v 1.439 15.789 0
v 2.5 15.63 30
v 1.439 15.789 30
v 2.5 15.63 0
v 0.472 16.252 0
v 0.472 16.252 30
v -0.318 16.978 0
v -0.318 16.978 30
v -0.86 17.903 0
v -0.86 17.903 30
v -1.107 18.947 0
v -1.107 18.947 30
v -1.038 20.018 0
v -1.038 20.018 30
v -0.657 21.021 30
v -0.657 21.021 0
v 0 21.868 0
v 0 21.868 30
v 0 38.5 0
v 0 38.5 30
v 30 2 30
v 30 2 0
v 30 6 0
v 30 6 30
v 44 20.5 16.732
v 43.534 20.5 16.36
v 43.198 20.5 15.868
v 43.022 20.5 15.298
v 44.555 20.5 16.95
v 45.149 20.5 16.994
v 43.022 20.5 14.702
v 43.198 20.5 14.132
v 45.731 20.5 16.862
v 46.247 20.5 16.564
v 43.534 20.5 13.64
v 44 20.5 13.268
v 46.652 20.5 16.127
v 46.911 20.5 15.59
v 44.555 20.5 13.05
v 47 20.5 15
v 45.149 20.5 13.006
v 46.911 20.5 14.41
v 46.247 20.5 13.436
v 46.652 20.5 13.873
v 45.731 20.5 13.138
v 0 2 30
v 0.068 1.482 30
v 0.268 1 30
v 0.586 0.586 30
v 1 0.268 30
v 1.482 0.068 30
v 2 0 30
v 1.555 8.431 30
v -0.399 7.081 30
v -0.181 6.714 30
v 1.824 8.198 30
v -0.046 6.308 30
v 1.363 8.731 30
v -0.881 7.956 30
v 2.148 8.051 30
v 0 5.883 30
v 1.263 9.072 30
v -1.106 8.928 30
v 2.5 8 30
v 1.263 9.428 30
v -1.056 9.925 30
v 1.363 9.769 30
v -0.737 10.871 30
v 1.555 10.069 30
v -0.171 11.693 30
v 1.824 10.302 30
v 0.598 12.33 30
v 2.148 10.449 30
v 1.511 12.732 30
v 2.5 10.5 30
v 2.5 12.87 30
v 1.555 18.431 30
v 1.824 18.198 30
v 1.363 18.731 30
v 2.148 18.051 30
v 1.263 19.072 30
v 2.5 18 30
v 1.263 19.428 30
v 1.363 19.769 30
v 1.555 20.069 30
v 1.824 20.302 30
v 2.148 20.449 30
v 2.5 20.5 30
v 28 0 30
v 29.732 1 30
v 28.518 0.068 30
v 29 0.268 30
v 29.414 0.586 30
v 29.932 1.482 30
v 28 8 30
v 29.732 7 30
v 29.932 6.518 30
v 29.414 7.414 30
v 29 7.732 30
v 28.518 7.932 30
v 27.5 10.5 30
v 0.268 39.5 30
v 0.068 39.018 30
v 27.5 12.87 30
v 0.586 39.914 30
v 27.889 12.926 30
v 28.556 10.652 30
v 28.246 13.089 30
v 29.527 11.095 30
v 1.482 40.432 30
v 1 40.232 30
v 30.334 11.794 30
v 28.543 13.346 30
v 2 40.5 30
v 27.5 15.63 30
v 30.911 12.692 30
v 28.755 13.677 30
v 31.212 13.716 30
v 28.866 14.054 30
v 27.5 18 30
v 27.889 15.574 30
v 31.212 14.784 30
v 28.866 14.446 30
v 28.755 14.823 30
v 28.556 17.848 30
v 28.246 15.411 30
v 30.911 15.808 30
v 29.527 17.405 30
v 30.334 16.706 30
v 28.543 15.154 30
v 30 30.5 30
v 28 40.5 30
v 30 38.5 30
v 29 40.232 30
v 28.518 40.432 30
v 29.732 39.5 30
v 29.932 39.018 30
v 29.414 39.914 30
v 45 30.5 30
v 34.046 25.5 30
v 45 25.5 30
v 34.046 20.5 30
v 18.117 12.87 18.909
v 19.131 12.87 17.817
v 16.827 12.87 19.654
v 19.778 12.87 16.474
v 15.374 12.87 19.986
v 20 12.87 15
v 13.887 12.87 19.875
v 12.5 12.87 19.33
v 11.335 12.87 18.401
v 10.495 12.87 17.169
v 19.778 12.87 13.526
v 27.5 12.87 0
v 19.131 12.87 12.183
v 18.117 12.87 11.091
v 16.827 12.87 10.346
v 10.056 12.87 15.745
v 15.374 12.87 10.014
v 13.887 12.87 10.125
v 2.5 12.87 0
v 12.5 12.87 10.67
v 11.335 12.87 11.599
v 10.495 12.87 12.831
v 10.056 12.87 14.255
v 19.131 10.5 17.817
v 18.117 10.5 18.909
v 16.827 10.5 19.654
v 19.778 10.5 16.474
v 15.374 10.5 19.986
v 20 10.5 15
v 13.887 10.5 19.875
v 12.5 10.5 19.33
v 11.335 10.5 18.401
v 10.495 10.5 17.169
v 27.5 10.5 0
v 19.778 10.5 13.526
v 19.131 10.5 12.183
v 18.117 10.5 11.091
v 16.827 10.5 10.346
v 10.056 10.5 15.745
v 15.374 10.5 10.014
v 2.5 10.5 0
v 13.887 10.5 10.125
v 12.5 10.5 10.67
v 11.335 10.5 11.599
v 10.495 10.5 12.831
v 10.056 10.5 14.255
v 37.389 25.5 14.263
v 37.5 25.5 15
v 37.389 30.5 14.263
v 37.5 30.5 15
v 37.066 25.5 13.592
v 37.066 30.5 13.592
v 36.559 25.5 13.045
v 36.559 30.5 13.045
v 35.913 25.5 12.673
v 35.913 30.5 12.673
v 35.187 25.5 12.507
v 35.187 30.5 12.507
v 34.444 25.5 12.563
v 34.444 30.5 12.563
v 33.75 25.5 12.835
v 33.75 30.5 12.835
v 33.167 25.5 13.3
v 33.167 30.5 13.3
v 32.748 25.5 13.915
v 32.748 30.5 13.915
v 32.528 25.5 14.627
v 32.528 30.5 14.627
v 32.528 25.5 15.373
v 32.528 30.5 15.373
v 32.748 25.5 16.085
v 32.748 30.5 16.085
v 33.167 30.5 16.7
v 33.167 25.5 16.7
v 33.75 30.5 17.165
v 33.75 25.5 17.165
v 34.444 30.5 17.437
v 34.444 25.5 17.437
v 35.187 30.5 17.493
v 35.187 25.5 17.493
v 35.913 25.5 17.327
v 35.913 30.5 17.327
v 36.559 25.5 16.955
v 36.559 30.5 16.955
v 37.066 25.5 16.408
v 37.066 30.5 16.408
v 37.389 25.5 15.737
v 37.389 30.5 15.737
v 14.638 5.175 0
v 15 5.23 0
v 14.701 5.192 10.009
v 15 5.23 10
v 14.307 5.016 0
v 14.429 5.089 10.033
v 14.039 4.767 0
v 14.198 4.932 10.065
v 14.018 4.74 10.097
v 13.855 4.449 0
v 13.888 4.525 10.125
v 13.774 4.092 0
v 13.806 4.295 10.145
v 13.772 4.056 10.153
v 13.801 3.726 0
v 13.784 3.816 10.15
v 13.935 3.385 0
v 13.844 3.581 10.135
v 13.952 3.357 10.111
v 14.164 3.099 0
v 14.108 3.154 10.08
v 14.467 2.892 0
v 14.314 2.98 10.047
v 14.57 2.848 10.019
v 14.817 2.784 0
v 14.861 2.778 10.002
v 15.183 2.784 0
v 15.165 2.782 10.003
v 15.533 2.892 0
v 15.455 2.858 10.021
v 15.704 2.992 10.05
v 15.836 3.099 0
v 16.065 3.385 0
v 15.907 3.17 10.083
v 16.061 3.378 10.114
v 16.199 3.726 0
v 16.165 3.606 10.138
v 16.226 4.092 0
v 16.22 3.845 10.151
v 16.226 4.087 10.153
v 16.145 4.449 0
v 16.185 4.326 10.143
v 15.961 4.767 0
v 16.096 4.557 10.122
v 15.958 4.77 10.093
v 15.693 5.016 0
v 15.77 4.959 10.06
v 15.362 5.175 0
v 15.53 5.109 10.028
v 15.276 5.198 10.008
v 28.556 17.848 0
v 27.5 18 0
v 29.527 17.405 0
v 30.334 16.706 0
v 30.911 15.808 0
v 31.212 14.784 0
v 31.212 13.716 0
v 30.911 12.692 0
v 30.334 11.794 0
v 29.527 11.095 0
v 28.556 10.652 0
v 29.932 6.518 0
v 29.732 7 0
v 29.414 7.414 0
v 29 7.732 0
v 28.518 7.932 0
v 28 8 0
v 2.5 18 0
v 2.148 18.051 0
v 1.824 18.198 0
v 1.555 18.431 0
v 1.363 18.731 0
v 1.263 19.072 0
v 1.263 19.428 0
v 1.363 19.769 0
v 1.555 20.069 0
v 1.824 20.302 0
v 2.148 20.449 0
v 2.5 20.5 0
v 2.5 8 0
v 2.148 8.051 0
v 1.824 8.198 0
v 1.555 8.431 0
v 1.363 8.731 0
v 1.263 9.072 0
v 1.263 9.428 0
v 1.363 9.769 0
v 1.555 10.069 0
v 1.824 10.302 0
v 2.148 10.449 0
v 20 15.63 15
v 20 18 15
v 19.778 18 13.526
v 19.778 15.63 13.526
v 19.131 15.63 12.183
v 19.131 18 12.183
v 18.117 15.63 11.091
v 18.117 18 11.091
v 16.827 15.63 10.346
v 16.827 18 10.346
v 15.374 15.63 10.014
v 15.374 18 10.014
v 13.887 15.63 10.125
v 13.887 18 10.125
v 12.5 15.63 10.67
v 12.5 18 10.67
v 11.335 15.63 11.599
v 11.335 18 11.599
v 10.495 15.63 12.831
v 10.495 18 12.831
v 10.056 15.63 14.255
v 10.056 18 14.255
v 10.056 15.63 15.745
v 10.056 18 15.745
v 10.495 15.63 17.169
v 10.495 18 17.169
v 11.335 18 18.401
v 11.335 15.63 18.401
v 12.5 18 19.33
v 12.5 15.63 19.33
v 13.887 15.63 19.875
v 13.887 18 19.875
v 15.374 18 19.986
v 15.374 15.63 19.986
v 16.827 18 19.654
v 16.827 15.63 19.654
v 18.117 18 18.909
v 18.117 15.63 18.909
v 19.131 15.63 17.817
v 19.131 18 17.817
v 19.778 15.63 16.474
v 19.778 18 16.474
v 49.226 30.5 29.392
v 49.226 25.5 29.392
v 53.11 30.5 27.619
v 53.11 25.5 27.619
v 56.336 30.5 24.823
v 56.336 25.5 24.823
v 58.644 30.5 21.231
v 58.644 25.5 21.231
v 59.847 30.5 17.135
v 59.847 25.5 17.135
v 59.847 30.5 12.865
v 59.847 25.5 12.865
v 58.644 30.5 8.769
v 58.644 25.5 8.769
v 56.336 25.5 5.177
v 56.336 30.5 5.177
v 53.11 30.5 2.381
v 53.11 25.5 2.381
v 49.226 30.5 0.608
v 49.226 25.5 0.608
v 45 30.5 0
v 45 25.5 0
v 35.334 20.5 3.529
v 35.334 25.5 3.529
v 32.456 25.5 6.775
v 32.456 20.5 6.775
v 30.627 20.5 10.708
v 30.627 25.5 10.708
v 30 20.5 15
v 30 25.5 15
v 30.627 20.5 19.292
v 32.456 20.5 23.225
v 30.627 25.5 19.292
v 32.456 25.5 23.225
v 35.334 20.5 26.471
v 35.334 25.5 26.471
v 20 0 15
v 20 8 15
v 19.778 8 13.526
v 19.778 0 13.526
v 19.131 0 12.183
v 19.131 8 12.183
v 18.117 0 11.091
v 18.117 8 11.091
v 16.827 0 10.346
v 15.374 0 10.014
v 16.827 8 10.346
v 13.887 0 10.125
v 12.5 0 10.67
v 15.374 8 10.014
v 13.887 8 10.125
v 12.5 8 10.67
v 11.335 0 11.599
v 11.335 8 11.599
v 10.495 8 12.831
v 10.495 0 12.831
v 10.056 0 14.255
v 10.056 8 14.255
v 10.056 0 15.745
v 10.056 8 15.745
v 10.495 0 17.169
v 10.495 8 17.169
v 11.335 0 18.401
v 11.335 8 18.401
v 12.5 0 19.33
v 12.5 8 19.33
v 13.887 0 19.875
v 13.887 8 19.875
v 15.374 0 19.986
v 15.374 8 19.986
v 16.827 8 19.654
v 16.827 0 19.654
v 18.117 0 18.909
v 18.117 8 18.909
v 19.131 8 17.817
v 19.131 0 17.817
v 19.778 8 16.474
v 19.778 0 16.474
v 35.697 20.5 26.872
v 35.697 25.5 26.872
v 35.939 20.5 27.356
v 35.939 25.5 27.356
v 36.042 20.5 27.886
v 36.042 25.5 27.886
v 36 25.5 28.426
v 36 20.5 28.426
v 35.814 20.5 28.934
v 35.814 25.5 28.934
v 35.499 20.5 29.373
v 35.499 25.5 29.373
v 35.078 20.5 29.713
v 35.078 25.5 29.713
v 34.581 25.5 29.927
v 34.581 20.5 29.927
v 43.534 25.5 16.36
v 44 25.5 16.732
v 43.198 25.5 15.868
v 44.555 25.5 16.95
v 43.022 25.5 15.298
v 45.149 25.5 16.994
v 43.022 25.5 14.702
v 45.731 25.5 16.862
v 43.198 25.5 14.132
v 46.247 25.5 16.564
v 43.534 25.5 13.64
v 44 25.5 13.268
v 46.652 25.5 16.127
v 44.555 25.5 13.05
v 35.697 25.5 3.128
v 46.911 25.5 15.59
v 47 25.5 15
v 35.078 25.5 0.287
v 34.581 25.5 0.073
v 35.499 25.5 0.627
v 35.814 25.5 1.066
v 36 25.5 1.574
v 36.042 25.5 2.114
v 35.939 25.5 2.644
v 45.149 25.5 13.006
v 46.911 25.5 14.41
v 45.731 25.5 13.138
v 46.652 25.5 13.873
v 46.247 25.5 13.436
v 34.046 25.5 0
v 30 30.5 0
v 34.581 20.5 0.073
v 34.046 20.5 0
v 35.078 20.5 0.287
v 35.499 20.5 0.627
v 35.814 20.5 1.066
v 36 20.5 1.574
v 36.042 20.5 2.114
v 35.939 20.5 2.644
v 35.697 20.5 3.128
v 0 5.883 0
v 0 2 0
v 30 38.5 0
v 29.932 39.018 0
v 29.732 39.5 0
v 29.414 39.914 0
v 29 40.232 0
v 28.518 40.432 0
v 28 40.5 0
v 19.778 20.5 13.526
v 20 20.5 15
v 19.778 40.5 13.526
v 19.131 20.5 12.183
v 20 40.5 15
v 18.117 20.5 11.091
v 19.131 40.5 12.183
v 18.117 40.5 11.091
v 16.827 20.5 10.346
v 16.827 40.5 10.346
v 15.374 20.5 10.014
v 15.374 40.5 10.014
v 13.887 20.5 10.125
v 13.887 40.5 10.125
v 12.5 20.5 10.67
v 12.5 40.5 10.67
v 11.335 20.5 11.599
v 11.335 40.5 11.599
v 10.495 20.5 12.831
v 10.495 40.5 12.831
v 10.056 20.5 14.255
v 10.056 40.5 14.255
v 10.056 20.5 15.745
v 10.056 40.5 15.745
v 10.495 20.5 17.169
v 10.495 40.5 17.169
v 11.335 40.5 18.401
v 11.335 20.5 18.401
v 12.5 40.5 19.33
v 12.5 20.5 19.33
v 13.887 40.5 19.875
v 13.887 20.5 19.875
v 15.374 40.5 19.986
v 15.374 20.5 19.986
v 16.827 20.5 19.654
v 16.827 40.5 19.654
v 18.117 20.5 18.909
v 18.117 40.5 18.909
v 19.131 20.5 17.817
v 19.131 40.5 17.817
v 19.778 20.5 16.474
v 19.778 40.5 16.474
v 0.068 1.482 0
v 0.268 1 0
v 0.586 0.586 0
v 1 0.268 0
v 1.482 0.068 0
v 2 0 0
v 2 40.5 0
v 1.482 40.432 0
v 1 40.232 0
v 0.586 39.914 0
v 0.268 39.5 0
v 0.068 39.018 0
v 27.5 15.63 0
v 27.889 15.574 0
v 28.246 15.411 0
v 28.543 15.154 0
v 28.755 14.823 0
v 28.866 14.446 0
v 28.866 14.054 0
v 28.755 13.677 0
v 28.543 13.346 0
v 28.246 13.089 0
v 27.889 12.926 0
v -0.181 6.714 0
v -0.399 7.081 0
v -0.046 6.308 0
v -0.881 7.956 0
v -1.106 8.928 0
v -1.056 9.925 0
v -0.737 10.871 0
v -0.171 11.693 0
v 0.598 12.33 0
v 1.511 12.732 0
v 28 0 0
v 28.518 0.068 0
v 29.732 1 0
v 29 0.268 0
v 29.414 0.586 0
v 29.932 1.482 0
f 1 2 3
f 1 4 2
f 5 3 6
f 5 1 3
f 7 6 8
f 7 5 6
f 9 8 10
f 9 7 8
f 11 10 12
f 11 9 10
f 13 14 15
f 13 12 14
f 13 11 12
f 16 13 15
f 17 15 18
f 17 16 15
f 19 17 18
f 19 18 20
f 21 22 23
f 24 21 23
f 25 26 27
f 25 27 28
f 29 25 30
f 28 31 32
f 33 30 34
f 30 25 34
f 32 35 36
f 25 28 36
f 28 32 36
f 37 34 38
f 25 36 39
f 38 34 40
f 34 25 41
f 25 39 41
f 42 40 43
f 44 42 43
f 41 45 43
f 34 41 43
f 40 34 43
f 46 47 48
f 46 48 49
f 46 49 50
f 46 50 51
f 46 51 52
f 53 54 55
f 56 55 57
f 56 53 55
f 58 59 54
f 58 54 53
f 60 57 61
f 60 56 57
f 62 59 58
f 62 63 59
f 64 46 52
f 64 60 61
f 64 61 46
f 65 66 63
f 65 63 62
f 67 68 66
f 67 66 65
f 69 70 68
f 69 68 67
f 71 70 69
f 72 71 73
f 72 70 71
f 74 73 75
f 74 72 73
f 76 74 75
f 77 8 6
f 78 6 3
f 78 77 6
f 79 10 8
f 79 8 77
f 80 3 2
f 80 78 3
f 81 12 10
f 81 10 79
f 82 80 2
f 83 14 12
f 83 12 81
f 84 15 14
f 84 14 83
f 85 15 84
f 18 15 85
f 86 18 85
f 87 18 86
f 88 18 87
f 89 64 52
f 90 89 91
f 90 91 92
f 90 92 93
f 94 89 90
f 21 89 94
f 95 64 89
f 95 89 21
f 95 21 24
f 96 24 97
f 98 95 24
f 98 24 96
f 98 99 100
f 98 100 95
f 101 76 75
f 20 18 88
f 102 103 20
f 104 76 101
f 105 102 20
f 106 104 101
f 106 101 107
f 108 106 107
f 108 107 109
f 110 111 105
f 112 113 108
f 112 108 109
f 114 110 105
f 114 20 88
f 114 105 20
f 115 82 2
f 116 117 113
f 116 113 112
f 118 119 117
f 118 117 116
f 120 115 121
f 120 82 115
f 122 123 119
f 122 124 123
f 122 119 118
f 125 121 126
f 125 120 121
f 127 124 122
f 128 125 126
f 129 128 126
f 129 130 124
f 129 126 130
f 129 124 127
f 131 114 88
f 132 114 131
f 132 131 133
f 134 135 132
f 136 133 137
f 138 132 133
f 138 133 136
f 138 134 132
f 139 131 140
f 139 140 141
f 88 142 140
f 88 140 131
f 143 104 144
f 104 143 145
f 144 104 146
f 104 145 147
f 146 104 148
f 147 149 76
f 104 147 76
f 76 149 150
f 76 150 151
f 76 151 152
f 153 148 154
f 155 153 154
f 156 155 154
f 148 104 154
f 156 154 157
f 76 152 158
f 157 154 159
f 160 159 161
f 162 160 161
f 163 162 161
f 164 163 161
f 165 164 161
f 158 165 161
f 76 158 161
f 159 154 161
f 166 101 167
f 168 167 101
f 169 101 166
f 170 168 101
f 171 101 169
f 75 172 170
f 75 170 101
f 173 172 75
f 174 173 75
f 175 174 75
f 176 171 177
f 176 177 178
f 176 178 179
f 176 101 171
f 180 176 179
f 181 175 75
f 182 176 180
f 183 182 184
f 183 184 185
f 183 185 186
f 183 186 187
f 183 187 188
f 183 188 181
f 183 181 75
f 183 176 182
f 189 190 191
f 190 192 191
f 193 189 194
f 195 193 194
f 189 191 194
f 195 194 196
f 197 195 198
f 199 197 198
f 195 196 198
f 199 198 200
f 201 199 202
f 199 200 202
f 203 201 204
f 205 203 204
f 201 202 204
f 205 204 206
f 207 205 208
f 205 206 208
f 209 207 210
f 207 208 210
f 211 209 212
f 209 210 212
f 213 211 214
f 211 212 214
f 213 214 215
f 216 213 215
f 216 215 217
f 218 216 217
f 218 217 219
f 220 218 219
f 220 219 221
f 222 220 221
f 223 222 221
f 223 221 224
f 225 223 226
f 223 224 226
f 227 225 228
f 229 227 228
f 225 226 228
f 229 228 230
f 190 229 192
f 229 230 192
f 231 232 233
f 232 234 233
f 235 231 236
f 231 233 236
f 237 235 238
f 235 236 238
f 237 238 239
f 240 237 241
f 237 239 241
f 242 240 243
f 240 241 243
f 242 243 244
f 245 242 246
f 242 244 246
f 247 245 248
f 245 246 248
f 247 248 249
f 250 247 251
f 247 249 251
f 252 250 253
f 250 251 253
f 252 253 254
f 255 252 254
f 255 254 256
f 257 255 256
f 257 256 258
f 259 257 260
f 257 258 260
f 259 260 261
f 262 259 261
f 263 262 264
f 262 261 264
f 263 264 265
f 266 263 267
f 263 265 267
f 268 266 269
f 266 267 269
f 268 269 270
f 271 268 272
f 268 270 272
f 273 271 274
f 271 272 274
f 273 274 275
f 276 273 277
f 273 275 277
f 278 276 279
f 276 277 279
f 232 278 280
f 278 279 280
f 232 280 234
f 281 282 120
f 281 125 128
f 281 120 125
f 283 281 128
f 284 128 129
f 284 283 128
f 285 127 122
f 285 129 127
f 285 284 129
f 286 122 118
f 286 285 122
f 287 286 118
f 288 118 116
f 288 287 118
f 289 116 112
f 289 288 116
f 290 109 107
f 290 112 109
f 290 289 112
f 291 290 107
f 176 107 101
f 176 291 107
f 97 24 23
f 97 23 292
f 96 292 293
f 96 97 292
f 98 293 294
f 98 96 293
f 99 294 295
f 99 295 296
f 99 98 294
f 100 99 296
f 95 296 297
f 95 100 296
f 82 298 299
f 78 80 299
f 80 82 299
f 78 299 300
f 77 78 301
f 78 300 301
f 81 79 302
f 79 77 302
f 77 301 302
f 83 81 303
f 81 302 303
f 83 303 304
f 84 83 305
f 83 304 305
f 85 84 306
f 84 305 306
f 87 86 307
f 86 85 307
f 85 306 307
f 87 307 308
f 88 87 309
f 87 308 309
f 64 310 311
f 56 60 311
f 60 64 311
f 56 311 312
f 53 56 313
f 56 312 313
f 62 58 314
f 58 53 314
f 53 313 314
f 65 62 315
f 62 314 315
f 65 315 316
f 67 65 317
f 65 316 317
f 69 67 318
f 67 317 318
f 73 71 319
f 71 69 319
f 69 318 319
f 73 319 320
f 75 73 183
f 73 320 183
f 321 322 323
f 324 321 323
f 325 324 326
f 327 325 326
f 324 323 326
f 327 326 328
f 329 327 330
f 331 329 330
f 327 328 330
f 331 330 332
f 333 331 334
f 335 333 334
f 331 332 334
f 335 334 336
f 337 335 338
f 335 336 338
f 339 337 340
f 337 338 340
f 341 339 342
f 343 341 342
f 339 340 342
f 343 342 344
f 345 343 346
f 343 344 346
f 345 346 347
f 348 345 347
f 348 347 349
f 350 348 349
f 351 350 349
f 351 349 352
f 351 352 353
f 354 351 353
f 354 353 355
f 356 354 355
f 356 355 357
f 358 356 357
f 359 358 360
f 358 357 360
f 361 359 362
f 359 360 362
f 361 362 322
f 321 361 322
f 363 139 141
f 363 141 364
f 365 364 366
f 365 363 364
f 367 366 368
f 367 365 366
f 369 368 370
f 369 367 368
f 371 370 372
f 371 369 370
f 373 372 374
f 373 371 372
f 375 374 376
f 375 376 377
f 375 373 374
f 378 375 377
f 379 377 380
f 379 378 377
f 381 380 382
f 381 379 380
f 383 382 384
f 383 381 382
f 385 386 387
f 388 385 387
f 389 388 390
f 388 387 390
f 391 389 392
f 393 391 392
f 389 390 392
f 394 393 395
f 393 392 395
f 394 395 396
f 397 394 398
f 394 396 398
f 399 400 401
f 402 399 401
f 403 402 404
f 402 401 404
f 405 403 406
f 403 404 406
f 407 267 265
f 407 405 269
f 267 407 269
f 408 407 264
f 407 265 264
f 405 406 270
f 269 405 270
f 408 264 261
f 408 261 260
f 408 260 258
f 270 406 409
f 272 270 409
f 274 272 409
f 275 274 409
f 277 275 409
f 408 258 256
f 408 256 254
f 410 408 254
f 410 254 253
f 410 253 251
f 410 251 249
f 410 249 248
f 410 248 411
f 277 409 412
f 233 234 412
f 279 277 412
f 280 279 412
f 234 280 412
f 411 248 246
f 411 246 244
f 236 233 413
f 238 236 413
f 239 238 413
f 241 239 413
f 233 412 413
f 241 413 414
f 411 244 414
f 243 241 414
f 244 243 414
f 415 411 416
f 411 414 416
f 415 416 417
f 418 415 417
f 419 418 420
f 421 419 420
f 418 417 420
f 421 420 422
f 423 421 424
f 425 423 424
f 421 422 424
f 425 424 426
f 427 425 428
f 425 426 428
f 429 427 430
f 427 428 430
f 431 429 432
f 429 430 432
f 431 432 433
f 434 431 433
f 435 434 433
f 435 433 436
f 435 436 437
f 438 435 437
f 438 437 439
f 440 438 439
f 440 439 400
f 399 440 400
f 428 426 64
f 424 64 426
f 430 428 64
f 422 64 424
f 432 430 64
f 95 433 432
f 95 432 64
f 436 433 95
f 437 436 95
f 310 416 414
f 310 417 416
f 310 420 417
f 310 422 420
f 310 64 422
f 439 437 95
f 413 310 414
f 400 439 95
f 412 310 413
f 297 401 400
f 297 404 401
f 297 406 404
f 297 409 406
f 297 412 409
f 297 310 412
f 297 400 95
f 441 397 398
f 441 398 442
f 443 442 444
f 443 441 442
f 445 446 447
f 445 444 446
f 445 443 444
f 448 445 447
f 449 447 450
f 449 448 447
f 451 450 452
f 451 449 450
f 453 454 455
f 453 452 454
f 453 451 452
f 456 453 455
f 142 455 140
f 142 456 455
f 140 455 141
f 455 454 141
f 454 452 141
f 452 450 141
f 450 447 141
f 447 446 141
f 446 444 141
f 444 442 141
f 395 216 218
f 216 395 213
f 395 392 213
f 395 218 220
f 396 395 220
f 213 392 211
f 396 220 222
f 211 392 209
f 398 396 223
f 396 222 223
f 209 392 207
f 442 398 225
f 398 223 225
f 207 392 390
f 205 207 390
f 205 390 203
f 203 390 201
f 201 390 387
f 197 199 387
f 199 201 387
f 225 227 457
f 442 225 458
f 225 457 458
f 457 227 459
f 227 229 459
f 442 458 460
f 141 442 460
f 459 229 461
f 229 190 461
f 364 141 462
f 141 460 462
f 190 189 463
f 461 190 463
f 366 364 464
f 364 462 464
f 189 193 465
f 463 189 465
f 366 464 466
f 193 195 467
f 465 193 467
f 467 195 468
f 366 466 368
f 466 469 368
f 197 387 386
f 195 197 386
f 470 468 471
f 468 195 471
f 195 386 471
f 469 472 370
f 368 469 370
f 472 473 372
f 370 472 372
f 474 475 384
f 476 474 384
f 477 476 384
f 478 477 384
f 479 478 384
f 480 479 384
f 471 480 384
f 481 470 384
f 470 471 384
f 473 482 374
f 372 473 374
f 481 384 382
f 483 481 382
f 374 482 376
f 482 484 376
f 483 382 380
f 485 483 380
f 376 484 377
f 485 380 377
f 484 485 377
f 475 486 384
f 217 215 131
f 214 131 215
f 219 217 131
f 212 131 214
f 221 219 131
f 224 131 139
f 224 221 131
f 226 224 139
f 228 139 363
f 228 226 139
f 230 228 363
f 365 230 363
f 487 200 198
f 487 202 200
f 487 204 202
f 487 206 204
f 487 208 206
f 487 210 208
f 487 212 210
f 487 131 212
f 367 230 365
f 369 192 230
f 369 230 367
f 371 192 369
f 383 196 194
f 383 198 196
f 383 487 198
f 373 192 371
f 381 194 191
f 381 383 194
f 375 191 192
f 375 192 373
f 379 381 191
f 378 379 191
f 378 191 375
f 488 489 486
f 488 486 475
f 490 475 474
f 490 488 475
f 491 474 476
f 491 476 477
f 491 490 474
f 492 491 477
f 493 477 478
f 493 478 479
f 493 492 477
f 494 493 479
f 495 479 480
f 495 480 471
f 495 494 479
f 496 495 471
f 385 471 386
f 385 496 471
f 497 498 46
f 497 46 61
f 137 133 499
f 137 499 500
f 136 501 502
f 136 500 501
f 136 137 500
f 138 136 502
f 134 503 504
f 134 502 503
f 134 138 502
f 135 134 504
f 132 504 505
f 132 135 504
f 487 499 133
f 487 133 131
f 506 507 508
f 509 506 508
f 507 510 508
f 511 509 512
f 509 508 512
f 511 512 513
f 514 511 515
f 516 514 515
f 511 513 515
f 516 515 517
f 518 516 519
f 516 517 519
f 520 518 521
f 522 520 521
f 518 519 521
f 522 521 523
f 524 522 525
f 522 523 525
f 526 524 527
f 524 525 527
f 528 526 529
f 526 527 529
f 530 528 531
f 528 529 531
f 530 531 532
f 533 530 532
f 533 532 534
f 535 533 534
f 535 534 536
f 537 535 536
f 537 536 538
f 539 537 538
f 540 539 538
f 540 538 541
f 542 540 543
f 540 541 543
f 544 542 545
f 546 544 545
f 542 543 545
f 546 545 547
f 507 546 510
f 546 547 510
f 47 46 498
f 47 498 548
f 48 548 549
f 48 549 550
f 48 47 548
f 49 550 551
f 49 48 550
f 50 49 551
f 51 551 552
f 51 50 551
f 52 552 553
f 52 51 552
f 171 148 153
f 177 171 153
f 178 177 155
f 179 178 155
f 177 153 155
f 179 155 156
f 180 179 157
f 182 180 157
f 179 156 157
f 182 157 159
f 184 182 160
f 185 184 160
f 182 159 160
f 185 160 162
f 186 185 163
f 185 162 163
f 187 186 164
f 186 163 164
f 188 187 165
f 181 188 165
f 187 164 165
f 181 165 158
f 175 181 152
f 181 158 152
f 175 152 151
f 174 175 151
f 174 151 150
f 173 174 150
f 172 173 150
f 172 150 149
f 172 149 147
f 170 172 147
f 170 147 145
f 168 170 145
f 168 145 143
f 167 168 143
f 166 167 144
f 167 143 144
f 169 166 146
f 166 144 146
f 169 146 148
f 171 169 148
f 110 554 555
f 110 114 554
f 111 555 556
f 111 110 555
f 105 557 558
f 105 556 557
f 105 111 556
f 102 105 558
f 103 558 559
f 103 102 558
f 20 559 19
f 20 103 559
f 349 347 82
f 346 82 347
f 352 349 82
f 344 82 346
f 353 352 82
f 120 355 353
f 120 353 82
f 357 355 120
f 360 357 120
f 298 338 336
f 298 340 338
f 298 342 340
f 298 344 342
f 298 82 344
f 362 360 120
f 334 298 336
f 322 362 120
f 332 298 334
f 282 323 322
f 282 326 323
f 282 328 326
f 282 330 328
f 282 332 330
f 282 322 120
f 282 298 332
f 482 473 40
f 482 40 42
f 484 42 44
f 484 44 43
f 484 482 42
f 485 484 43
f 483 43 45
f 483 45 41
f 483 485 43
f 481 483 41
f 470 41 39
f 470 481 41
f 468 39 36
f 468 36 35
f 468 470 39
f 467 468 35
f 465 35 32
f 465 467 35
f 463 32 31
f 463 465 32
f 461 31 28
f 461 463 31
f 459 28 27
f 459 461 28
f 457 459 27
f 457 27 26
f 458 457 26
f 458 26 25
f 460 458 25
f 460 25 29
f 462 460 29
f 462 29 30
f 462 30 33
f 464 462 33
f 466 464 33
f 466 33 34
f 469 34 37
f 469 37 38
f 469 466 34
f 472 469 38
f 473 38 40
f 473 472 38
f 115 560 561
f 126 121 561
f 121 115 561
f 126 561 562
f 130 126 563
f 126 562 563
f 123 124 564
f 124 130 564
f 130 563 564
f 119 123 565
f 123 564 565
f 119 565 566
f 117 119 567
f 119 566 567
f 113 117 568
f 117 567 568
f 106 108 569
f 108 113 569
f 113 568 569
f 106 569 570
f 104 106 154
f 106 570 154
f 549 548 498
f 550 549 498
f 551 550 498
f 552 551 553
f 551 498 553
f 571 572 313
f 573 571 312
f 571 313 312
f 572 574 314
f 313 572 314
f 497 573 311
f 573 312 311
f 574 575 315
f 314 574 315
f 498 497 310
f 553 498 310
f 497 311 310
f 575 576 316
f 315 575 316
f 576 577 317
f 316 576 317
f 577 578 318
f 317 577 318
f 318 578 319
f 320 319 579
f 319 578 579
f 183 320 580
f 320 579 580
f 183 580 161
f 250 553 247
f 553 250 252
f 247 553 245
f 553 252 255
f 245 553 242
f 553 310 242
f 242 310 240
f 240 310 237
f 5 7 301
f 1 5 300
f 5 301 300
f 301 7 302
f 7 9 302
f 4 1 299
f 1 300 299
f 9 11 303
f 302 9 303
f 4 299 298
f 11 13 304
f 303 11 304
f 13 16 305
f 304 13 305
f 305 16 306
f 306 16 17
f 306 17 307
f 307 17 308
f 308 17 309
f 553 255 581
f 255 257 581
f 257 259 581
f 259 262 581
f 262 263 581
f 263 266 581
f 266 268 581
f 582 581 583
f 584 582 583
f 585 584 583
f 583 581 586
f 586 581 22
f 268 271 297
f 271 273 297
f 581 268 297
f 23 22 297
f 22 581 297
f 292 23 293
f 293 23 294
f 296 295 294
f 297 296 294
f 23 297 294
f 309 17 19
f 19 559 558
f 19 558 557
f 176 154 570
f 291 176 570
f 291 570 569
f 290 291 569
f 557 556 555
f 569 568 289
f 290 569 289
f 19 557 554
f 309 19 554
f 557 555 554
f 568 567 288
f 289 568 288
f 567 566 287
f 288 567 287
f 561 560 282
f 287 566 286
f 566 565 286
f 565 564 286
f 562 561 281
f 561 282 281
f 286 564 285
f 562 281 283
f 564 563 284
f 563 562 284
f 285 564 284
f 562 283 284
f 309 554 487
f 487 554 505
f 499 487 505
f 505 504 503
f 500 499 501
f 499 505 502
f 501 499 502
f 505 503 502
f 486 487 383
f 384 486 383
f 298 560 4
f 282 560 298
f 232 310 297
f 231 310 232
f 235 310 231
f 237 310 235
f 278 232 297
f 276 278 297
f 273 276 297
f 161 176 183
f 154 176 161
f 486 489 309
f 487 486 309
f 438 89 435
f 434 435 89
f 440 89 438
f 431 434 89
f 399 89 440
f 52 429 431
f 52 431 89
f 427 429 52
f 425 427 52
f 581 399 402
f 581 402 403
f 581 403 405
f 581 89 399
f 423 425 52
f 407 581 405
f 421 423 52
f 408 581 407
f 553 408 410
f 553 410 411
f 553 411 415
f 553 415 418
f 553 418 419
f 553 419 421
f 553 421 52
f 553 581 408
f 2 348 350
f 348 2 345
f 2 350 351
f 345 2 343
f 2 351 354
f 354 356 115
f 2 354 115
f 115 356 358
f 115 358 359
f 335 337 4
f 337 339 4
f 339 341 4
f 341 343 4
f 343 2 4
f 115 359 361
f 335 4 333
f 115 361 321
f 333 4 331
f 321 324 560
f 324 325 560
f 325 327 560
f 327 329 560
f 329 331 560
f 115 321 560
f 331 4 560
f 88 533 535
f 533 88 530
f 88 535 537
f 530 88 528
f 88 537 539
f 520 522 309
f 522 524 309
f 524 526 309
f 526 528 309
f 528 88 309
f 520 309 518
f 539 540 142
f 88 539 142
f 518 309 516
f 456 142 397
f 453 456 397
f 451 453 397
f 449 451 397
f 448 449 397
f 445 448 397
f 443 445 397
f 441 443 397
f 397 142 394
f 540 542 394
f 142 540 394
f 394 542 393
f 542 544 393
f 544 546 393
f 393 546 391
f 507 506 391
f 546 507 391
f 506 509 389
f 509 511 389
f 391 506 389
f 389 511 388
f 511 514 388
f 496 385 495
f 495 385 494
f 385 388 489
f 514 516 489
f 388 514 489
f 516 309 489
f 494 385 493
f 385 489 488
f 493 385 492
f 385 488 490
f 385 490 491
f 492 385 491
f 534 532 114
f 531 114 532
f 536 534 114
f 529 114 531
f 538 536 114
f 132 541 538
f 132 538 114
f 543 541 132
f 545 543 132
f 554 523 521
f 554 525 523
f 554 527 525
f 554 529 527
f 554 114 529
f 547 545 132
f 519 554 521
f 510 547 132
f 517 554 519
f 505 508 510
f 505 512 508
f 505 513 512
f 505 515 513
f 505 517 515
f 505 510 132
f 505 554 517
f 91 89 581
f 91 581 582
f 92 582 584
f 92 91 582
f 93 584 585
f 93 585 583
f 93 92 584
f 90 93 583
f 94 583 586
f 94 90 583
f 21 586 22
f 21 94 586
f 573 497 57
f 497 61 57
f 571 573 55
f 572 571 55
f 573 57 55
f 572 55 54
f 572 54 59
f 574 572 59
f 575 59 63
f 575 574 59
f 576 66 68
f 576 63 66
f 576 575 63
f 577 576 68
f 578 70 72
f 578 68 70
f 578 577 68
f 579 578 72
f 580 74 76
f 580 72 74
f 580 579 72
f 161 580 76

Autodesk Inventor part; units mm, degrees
ref_plane "YZ Plane" through (0, 0, 0) normal (1, 0, 0) x (0, 1, 0)
ref_plane "XZ Plane" through (0, 0, 0) normal (0, 1, 0) x (-1, 0, 0)
ref_plane "XY Plane" through (0, 0, 0) normal (0, 0, 1) x (1, 0, 0)
sketch "Skizze3" plane through (0, 0, 0) normal (0, 0, 1) x (1, 0, 0)
  line L0 (0, 0) -> (0, 8)
  line L1 (0, 8) -> (30, 8)
  line L2 (30, 0) -> (0, 0)
  arc A0 (2.5, 21.75) -> (2.5, 16.75) centre (2.5, 19.25) ccw construction
  arc A1 (27.5, 11.75) -> (27.5, 16.75) centre (27.5, 14.25) ccw construction
  line L3 (27.5, 16.75) -> (2.5, 16.75) construction
  line L4 (2.5, 11.75) -> (27.5, 11.75) construction
  arc A2 (2.5, 11.75) -> (0.3349, 8) centre (2.5, 9.25) ccw construction
  line L5 (0, 20.5) -> (0, 40.5)
  line L6 (0, 40.5) -> (30, 40.5)
  arc A3 (0, 21.8681) -> (2.5, 15.63) centre (2.5, 19.25) ccw
  line L7 (2.5, 15.63) -> (27.5, 15.63)
  arc A4 (27.5, 12.87) -> (27.5, 15.63) centre (27.5, 14.25) ccw
  line L8 (27.5, 12.87) -> (2.5, 12.87)
  arc A5 (2.5, 12.87) -> (0, 6.6319) centre (2.5, 9.25) ccw
  arc A6 (2.5, 20.5) -> (2.5, 18) centre (2.5, 19.25) ccw
  line L9 (2.5, 18) -> (27.5, 18)
  arc A7 (27.5, 10.5) -> (27.5, 18) centre (27.5, 14.25) ccw
  line L10 (27.5, 10.5) -> (2.5, 10.5)
  arc A8 (2.5, 10.5) -> (2.5, 8) centre (2.5, 9.25) ccw
  line L11 (0, 20.5) -> (30, 20.5)
  line L12 (30, 20.5) -> (30, 20.5)
  line L13 (30, 20.5) -> (30, 30.5)
  line L14 (30, 40.5) -> (30, 30.5)
  line L15 (30, 0) -> (30, 8)
  line L16 (30, 30.5) -> (60, 30.5)
  line L17 (60, 30.5) -> (60, 25.5)
  line L18 (30, 25.5) -> (60, 25.5)
  point P0 (15, 4)
  point P1 (0, 4)
  point P2 (15, 0)
  point P3 (30, 30.5)
  dimension "d4" = 8
  dimension "d11" = 5
  dimension "d12" = 5
  dimension "d17" = 5
  dimension "d19" = 1.12
  dimension "d20" = 1.25
  dimension "d22" = 20
  dimension "d23" = 30
  dimension "d54" = 30
  dimension "d71" = 5
  dimension "d72" = 5
  dimension "d73" = 30
extrude "Extrusion3" add sketch "Skizze3" along normal blind 30
sketch "Skizze4" plane through (30, 30.5, 0) normal (0, 1, 0) x (1, 0, 0)
  circle A0 centre (15, -15) radius 2
  circle A1 centre (5, -15) radius 2.5
  circle A2 centre (15, -15) radius 15
  line L0 (30, 0) -> (0, 0) projected
  line L1 (0, 0) -> (0, -30) projected
  line L2 (30, -30) -> (0, -30) projected
  line L3 (30, 0) -> (30, -30) projected
  circle A3 centre (15, -15) radius 15
  line L4 (0, 0) -> (0, -30) projected
  point P0 (0, -18)
  point P1 (25, -18)
  point P2 (24, -15)
  point P3 (29.5215, -11.2415)
  point P4 (-20, -18)
  point P5 (10.3125, -7.5196)
  point P6 (10.3125, -12.4804)
  point P7 (30, -15)
  point P8 (15, 0)
  point P9 (15, -30)
  point P10 (0, -15)
  point P11 (15, 0)
  point P12 (15, -30)
  dimension "d36" = 5
  dimension "d75" = 10
  dimension "d76" = 4
sketch "Skizze6" plane through (0, 40.5, 0) normal (0, 1, 0) x (1, 0, 0)
  circle A0 centre (15, -15) radius 5
  line L0 (30, -30) -> (0, -30) projected
  line L1 (0, 0) -> (0, -30) projected
  point P0 (15, -30)
  point P1 (0, -15)
  dimension "d51" = 10
extrude "Extrusion9" cut sketch "Skizze6" against normal through all
extrude "Extrusion6" cut sketch "Skizze4" against normal through all contours A1 | L3 L2 A2 | A2 L0 L3
extrude "Extrusion7" add sketch "Skizze4" against normal blind 10 contours A0 | A2 L1 L0 | L2 L1 A2
hole "Bohrung1" at (15, 4, 0) direction (0, 0, 1) diameter 2.459 end up to surface thread size "M3x0.5" class "6H" standard "ISO Metric profile"
fillet "Rundung3" radius 2 8 edges at (0, 40.5, 15) (30, 40.5, 15) (30, 0, 15) (30, 8, 15) (0, 0, 15) (0, 6.6319, 15) (45, 23, 0) (45, 23, 30)
equation "\"d12\" = d11"
properties part number "BT505_trajan20_22" material "Kunststoff, undurchsichtig Weiß"
